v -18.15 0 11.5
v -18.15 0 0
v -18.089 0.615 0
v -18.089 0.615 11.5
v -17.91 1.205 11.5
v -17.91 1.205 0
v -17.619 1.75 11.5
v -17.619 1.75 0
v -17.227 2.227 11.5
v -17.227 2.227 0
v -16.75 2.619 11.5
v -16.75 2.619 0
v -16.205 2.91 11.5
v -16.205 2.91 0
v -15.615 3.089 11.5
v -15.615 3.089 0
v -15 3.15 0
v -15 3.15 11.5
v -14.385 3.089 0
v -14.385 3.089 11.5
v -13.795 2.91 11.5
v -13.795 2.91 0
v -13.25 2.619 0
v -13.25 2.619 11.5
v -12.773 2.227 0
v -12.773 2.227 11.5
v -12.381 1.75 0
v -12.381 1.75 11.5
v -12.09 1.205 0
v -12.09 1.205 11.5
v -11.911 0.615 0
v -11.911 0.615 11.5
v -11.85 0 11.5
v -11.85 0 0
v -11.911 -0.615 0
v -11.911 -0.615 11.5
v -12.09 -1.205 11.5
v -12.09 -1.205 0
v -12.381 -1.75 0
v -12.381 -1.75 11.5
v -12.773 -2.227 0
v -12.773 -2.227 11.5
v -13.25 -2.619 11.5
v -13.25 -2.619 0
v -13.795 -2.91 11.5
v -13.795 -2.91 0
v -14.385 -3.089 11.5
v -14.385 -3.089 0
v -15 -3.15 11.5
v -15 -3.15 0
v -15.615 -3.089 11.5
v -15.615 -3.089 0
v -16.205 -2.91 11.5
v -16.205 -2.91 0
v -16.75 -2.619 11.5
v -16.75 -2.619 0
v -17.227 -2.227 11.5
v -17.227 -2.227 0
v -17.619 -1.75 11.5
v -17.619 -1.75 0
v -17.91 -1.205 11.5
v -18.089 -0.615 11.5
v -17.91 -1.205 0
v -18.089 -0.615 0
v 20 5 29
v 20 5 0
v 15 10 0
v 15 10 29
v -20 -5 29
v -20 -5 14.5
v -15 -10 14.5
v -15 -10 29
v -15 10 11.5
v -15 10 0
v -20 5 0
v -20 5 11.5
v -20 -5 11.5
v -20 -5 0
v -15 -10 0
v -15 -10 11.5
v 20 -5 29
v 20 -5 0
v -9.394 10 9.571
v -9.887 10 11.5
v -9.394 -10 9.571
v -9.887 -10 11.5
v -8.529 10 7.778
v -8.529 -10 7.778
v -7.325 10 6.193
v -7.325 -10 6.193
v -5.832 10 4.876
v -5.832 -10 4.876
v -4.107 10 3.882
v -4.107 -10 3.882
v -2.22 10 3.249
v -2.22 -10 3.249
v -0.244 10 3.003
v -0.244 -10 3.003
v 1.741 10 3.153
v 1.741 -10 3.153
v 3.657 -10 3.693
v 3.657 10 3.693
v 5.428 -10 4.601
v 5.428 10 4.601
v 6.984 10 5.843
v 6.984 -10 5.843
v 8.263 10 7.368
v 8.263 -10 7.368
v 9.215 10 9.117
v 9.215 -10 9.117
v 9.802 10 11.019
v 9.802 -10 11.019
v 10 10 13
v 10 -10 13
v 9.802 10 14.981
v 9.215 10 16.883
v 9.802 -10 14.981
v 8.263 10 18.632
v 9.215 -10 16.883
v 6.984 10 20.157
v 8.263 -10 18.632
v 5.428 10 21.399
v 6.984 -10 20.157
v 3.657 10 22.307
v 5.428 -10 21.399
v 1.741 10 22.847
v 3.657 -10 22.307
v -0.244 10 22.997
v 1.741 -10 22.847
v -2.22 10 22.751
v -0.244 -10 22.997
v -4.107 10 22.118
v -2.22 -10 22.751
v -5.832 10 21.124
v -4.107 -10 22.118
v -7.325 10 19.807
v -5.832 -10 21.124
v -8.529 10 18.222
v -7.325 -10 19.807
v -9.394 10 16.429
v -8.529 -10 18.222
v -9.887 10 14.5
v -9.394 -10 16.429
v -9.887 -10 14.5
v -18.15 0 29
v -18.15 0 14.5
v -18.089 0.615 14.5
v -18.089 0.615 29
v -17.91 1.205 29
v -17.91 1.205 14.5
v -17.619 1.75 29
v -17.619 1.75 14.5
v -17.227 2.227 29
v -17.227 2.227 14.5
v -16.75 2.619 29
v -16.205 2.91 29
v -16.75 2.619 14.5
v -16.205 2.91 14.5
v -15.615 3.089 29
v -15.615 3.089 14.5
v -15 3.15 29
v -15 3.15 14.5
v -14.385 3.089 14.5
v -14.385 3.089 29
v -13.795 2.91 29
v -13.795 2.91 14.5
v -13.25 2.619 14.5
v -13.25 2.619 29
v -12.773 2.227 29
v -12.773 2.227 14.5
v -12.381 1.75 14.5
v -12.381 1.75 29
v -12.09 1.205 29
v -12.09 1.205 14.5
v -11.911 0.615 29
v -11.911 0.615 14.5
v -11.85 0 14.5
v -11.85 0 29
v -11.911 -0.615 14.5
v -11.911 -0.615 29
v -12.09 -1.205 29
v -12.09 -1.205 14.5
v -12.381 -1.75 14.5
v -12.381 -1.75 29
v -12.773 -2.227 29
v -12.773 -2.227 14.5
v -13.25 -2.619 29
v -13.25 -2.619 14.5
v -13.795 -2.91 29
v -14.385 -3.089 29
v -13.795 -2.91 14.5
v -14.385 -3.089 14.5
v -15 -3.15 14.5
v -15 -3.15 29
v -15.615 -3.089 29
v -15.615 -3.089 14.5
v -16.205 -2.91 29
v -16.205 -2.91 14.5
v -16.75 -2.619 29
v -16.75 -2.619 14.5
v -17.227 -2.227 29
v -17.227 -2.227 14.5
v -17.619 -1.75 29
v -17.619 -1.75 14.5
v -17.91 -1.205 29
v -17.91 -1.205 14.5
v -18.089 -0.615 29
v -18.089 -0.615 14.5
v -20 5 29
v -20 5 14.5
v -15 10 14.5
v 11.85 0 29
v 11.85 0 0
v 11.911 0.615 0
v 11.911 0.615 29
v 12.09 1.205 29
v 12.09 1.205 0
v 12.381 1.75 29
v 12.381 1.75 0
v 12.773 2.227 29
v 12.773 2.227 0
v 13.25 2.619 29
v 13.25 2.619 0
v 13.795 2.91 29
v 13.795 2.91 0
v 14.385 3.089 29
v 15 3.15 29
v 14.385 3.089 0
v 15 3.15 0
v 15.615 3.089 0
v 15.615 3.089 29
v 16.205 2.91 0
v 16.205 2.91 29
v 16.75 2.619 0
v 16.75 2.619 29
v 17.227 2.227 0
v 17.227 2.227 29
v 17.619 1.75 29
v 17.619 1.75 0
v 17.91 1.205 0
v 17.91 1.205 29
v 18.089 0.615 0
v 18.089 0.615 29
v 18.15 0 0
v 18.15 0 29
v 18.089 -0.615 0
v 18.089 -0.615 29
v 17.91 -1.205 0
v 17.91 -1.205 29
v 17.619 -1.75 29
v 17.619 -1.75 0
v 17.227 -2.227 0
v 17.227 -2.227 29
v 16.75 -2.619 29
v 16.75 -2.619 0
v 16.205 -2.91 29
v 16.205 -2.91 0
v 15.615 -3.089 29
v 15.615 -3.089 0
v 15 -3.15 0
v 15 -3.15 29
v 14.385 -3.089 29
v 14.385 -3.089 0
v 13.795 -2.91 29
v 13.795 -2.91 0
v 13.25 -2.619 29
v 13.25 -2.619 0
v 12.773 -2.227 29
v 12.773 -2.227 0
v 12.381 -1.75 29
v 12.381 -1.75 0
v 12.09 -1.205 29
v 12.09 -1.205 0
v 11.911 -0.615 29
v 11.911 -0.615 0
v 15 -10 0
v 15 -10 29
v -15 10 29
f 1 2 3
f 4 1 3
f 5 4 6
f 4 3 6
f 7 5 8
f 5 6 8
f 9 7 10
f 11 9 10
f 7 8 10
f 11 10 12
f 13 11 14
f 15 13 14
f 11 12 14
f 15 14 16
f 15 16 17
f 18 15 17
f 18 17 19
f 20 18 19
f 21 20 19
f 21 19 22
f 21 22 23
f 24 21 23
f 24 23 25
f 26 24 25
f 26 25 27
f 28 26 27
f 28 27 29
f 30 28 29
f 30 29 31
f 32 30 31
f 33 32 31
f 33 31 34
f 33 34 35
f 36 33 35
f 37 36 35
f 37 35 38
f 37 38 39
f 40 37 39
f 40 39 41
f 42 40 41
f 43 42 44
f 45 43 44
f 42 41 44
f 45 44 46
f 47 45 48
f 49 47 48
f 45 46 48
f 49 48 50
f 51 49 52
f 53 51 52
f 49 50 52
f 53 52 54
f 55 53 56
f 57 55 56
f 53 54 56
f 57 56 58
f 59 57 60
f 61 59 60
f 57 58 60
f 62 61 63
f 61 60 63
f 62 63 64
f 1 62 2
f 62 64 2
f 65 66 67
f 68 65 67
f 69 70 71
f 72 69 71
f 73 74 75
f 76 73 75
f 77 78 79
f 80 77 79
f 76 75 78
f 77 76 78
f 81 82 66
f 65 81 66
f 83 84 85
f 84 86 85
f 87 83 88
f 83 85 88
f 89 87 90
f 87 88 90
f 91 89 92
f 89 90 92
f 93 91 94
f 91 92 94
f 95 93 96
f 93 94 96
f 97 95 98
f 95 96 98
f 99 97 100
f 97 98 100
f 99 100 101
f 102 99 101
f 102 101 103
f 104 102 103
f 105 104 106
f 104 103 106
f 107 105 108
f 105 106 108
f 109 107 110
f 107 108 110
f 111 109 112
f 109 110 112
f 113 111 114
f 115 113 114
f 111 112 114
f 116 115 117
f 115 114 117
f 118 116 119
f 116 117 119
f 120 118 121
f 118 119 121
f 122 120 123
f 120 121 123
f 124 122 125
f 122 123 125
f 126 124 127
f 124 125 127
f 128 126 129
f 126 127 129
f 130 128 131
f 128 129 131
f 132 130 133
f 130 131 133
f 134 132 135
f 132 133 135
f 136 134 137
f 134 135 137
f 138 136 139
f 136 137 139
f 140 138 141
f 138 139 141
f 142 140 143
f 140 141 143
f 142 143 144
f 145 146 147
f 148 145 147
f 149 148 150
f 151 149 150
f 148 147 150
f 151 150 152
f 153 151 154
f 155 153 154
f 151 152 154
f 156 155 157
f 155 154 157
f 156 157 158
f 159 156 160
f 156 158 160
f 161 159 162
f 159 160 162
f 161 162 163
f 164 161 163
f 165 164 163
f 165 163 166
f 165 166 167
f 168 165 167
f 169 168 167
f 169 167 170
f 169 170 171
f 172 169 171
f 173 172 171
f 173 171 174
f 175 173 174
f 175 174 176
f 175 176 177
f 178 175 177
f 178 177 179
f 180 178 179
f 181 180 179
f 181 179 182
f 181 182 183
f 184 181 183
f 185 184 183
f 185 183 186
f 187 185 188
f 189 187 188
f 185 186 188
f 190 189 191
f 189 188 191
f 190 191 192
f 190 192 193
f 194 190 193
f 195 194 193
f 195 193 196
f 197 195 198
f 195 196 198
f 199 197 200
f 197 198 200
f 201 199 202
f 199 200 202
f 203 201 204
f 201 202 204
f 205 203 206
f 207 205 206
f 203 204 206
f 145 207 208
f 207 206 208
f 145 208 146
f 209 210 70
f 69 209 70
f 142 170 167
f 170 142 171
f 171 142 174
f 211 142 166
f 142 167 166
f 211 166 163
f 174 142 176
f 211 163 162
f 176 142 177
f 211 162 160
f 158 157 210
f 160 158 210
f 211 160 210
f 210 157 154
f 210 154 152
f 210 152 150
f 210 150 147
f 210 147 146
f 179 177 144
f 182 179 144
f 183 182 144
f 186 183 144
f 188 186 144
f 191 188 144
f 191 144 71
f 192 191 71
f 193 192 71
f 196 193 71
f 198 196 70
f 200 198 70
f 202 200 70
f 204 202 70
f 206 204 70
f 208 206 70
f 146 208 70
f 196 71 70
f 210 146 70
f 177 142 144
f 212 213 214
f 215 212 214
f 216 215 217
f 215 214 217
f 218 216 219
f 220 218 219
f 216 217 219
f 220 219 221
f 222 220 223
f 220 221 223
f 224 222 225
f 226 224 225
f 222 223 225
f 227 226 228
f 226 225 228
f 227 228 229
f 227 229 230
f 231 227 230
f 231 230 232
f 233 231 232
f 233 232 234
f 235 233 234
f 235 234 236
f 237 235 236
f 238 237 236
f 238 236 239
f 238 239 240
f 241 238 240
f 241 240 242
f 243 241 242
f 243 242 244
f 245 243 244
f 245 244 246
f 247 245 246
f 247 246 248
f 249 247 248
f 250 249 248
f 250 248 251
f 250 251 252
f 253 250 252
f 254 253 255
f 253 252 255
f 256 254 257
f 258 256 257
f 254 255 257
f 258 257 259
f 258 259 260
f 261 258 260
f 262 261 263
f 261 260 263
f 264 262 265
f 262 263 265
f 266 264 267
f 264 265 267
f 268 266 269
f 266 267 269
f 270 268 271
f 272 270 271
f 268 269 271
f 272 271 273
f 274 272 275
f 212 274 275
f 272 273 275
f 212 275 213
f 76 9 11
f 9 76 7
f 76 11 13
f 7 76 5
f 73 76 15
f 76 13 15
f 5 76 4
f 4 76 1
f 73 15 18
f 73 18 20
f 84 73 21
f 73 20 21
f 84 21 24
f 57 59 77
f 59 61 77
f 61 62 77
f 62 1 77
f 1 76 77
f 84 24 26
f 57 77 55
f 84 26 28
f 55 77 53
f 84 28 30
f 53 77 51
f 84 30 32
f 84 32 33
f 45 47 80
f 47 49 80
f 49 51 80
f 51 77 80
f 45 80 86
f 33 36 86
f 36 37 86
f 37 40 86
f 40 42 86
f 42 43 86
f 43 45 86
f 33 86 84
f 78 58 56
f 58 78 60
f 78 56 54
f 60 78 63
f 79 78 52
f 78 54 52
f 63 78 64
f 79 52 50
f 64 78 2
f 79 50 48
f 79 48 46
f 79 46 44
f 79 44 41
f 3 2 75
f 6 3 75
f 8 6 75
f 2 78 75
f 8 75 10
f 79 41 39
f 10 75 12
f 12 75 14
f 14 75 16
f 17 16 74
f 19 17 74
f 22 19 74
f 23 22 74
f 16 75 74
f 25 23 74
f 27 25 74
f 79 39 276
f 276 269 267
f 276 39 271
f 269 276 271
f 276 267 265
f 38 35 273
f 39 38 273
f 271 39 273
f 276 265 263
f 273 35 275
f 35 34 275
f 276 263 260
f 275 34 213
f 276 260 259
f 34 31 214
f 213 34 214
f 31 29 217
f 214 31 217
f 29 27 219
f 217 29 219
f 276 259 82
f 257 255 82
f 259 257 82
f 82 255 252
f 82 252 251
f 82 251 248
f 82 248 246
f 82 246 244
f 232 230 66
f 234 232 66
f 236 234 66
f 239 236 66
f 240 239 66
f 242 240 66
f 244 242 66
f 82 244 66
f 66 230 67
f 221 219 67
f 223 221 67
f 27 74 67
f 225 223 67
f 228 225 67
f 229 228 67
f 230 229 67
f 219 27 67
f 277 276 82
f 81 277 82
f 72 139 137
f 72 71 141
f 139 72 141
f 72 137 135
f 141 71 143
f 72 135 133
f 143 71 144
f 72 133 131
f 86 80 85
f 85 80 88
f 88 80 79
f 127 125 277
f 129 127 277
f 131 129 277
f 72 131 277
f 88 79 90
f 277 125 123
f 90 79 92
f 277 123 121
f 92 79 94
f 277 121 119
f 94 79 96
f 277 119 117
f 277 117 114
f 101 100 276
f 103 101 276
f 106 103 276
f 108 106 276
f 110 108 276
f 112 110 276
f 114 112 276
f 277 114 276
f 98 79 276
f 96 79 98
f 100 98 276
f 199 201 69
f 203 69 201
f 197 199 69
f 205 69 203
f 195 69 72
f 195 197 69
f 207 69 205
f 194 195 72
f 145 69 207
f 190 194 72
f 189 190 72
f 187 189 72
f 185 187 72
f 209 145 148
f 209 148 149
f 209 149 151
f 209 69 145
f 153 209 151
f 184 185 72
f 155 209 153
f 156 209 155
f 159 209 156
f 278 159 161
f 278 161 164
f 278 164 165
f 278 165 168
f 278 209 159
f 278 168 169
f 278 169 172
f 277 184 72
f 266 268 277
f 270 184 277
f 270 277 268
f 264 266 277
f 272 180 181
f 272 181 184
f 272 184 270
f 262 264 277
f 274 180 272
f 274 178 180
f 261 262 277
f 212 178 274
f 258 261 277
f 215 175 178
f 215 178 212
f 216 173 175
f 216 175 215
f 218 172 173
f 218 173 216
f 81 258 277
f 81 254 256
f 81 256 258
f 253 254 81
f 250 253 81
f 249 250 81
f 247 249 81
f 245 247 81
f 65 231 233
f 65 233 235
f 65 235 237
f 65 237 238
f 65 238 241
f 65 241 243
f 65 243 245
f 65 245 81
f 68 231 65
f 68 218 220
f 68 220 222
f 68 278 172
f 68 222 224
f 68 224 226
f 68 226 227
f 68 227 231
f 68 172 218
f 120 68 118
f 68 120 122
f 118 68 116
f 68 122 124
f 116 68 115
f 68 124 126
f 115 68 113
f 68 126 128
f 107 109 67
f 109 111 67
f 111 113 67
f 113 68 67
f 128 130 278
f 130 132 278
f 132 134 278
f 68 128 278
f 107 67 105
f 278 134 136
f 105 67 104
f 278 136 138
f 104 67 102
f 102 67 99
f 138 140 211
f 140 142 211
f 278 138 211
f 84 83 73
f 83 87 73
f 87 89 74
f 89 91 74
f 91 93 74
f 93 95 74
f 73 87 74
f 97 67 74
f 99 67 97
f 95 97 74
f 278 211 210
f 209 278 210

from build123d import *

# Parameters (mm, degrees)
F1_DEPTH = 29
F2_R     = 10
F3_DEPTH = 20.001
F4_W     = 9.6138500422
F4_H     = 3
F5_DEPTH = 20.001
F7_D     = 6.3


with BuildPart() as f1:
    # F0 (on Top) → F1 (new body)
    with BuildSketch(Plane.XY):
        Polygon((20, 5), (15, 10), (-15, 10), (-20, 5), (-20, -5), (-15, -10), (15, -10), (20, -5), align=None)
    extrude(amount=F1_DEPTH)

    # F2 (on face) → F3 (cut, through all)
    with BuildSketch(Plane.XZ.offset(10)):
        with Locations((0, 13)):
            Circle(F2_R)
    extrude(amount=-F3_DEPTH, mode=Mode.SUBTRACT)

    # F4 (on face) → F5 (cut, through all)
    with BuildSketch(Plane.XZ.offset(10)):
        with Locations((-19.8069250211, 13)):
            Rectangle(F4_W, F4_H)
        with BuildLine():
            Line((-9.8868599666, 11.5), (-4.6138500422, 11.5))
            Line((-4.6138500422, 11.5), (-4.6138500422, 14.5))
            Line((-4.6138500422, 14.5), (-9.8868599666, 14.5))
            ThreePointArc((-9.8868599666, 14.5), (-10, 13), (-9.8868599666, 11.5))
        make_face()
        with BuildLine():
            Line((-15, 11.5), (-9.8868599666, 11.5))
            ThreePointArc((-9.8868599666, 11.5), (-10, 13), (-9.8868599666, 14.5))
            Line((-9.8868599666, 14.5), (-15, 14.5))
            Line((-15, 14.5), (-15, 11.5))
        make_face()
    extrude(amount=-F5_DEPTH, mode=Mode.SUBTRACT)

    # F7 (through all)
    with Locations(Plane.XY.offset(29)):
        with Locations((-15, 0), (15, 0)):
            Hole(F7_D / 2)


solid = f1.part
